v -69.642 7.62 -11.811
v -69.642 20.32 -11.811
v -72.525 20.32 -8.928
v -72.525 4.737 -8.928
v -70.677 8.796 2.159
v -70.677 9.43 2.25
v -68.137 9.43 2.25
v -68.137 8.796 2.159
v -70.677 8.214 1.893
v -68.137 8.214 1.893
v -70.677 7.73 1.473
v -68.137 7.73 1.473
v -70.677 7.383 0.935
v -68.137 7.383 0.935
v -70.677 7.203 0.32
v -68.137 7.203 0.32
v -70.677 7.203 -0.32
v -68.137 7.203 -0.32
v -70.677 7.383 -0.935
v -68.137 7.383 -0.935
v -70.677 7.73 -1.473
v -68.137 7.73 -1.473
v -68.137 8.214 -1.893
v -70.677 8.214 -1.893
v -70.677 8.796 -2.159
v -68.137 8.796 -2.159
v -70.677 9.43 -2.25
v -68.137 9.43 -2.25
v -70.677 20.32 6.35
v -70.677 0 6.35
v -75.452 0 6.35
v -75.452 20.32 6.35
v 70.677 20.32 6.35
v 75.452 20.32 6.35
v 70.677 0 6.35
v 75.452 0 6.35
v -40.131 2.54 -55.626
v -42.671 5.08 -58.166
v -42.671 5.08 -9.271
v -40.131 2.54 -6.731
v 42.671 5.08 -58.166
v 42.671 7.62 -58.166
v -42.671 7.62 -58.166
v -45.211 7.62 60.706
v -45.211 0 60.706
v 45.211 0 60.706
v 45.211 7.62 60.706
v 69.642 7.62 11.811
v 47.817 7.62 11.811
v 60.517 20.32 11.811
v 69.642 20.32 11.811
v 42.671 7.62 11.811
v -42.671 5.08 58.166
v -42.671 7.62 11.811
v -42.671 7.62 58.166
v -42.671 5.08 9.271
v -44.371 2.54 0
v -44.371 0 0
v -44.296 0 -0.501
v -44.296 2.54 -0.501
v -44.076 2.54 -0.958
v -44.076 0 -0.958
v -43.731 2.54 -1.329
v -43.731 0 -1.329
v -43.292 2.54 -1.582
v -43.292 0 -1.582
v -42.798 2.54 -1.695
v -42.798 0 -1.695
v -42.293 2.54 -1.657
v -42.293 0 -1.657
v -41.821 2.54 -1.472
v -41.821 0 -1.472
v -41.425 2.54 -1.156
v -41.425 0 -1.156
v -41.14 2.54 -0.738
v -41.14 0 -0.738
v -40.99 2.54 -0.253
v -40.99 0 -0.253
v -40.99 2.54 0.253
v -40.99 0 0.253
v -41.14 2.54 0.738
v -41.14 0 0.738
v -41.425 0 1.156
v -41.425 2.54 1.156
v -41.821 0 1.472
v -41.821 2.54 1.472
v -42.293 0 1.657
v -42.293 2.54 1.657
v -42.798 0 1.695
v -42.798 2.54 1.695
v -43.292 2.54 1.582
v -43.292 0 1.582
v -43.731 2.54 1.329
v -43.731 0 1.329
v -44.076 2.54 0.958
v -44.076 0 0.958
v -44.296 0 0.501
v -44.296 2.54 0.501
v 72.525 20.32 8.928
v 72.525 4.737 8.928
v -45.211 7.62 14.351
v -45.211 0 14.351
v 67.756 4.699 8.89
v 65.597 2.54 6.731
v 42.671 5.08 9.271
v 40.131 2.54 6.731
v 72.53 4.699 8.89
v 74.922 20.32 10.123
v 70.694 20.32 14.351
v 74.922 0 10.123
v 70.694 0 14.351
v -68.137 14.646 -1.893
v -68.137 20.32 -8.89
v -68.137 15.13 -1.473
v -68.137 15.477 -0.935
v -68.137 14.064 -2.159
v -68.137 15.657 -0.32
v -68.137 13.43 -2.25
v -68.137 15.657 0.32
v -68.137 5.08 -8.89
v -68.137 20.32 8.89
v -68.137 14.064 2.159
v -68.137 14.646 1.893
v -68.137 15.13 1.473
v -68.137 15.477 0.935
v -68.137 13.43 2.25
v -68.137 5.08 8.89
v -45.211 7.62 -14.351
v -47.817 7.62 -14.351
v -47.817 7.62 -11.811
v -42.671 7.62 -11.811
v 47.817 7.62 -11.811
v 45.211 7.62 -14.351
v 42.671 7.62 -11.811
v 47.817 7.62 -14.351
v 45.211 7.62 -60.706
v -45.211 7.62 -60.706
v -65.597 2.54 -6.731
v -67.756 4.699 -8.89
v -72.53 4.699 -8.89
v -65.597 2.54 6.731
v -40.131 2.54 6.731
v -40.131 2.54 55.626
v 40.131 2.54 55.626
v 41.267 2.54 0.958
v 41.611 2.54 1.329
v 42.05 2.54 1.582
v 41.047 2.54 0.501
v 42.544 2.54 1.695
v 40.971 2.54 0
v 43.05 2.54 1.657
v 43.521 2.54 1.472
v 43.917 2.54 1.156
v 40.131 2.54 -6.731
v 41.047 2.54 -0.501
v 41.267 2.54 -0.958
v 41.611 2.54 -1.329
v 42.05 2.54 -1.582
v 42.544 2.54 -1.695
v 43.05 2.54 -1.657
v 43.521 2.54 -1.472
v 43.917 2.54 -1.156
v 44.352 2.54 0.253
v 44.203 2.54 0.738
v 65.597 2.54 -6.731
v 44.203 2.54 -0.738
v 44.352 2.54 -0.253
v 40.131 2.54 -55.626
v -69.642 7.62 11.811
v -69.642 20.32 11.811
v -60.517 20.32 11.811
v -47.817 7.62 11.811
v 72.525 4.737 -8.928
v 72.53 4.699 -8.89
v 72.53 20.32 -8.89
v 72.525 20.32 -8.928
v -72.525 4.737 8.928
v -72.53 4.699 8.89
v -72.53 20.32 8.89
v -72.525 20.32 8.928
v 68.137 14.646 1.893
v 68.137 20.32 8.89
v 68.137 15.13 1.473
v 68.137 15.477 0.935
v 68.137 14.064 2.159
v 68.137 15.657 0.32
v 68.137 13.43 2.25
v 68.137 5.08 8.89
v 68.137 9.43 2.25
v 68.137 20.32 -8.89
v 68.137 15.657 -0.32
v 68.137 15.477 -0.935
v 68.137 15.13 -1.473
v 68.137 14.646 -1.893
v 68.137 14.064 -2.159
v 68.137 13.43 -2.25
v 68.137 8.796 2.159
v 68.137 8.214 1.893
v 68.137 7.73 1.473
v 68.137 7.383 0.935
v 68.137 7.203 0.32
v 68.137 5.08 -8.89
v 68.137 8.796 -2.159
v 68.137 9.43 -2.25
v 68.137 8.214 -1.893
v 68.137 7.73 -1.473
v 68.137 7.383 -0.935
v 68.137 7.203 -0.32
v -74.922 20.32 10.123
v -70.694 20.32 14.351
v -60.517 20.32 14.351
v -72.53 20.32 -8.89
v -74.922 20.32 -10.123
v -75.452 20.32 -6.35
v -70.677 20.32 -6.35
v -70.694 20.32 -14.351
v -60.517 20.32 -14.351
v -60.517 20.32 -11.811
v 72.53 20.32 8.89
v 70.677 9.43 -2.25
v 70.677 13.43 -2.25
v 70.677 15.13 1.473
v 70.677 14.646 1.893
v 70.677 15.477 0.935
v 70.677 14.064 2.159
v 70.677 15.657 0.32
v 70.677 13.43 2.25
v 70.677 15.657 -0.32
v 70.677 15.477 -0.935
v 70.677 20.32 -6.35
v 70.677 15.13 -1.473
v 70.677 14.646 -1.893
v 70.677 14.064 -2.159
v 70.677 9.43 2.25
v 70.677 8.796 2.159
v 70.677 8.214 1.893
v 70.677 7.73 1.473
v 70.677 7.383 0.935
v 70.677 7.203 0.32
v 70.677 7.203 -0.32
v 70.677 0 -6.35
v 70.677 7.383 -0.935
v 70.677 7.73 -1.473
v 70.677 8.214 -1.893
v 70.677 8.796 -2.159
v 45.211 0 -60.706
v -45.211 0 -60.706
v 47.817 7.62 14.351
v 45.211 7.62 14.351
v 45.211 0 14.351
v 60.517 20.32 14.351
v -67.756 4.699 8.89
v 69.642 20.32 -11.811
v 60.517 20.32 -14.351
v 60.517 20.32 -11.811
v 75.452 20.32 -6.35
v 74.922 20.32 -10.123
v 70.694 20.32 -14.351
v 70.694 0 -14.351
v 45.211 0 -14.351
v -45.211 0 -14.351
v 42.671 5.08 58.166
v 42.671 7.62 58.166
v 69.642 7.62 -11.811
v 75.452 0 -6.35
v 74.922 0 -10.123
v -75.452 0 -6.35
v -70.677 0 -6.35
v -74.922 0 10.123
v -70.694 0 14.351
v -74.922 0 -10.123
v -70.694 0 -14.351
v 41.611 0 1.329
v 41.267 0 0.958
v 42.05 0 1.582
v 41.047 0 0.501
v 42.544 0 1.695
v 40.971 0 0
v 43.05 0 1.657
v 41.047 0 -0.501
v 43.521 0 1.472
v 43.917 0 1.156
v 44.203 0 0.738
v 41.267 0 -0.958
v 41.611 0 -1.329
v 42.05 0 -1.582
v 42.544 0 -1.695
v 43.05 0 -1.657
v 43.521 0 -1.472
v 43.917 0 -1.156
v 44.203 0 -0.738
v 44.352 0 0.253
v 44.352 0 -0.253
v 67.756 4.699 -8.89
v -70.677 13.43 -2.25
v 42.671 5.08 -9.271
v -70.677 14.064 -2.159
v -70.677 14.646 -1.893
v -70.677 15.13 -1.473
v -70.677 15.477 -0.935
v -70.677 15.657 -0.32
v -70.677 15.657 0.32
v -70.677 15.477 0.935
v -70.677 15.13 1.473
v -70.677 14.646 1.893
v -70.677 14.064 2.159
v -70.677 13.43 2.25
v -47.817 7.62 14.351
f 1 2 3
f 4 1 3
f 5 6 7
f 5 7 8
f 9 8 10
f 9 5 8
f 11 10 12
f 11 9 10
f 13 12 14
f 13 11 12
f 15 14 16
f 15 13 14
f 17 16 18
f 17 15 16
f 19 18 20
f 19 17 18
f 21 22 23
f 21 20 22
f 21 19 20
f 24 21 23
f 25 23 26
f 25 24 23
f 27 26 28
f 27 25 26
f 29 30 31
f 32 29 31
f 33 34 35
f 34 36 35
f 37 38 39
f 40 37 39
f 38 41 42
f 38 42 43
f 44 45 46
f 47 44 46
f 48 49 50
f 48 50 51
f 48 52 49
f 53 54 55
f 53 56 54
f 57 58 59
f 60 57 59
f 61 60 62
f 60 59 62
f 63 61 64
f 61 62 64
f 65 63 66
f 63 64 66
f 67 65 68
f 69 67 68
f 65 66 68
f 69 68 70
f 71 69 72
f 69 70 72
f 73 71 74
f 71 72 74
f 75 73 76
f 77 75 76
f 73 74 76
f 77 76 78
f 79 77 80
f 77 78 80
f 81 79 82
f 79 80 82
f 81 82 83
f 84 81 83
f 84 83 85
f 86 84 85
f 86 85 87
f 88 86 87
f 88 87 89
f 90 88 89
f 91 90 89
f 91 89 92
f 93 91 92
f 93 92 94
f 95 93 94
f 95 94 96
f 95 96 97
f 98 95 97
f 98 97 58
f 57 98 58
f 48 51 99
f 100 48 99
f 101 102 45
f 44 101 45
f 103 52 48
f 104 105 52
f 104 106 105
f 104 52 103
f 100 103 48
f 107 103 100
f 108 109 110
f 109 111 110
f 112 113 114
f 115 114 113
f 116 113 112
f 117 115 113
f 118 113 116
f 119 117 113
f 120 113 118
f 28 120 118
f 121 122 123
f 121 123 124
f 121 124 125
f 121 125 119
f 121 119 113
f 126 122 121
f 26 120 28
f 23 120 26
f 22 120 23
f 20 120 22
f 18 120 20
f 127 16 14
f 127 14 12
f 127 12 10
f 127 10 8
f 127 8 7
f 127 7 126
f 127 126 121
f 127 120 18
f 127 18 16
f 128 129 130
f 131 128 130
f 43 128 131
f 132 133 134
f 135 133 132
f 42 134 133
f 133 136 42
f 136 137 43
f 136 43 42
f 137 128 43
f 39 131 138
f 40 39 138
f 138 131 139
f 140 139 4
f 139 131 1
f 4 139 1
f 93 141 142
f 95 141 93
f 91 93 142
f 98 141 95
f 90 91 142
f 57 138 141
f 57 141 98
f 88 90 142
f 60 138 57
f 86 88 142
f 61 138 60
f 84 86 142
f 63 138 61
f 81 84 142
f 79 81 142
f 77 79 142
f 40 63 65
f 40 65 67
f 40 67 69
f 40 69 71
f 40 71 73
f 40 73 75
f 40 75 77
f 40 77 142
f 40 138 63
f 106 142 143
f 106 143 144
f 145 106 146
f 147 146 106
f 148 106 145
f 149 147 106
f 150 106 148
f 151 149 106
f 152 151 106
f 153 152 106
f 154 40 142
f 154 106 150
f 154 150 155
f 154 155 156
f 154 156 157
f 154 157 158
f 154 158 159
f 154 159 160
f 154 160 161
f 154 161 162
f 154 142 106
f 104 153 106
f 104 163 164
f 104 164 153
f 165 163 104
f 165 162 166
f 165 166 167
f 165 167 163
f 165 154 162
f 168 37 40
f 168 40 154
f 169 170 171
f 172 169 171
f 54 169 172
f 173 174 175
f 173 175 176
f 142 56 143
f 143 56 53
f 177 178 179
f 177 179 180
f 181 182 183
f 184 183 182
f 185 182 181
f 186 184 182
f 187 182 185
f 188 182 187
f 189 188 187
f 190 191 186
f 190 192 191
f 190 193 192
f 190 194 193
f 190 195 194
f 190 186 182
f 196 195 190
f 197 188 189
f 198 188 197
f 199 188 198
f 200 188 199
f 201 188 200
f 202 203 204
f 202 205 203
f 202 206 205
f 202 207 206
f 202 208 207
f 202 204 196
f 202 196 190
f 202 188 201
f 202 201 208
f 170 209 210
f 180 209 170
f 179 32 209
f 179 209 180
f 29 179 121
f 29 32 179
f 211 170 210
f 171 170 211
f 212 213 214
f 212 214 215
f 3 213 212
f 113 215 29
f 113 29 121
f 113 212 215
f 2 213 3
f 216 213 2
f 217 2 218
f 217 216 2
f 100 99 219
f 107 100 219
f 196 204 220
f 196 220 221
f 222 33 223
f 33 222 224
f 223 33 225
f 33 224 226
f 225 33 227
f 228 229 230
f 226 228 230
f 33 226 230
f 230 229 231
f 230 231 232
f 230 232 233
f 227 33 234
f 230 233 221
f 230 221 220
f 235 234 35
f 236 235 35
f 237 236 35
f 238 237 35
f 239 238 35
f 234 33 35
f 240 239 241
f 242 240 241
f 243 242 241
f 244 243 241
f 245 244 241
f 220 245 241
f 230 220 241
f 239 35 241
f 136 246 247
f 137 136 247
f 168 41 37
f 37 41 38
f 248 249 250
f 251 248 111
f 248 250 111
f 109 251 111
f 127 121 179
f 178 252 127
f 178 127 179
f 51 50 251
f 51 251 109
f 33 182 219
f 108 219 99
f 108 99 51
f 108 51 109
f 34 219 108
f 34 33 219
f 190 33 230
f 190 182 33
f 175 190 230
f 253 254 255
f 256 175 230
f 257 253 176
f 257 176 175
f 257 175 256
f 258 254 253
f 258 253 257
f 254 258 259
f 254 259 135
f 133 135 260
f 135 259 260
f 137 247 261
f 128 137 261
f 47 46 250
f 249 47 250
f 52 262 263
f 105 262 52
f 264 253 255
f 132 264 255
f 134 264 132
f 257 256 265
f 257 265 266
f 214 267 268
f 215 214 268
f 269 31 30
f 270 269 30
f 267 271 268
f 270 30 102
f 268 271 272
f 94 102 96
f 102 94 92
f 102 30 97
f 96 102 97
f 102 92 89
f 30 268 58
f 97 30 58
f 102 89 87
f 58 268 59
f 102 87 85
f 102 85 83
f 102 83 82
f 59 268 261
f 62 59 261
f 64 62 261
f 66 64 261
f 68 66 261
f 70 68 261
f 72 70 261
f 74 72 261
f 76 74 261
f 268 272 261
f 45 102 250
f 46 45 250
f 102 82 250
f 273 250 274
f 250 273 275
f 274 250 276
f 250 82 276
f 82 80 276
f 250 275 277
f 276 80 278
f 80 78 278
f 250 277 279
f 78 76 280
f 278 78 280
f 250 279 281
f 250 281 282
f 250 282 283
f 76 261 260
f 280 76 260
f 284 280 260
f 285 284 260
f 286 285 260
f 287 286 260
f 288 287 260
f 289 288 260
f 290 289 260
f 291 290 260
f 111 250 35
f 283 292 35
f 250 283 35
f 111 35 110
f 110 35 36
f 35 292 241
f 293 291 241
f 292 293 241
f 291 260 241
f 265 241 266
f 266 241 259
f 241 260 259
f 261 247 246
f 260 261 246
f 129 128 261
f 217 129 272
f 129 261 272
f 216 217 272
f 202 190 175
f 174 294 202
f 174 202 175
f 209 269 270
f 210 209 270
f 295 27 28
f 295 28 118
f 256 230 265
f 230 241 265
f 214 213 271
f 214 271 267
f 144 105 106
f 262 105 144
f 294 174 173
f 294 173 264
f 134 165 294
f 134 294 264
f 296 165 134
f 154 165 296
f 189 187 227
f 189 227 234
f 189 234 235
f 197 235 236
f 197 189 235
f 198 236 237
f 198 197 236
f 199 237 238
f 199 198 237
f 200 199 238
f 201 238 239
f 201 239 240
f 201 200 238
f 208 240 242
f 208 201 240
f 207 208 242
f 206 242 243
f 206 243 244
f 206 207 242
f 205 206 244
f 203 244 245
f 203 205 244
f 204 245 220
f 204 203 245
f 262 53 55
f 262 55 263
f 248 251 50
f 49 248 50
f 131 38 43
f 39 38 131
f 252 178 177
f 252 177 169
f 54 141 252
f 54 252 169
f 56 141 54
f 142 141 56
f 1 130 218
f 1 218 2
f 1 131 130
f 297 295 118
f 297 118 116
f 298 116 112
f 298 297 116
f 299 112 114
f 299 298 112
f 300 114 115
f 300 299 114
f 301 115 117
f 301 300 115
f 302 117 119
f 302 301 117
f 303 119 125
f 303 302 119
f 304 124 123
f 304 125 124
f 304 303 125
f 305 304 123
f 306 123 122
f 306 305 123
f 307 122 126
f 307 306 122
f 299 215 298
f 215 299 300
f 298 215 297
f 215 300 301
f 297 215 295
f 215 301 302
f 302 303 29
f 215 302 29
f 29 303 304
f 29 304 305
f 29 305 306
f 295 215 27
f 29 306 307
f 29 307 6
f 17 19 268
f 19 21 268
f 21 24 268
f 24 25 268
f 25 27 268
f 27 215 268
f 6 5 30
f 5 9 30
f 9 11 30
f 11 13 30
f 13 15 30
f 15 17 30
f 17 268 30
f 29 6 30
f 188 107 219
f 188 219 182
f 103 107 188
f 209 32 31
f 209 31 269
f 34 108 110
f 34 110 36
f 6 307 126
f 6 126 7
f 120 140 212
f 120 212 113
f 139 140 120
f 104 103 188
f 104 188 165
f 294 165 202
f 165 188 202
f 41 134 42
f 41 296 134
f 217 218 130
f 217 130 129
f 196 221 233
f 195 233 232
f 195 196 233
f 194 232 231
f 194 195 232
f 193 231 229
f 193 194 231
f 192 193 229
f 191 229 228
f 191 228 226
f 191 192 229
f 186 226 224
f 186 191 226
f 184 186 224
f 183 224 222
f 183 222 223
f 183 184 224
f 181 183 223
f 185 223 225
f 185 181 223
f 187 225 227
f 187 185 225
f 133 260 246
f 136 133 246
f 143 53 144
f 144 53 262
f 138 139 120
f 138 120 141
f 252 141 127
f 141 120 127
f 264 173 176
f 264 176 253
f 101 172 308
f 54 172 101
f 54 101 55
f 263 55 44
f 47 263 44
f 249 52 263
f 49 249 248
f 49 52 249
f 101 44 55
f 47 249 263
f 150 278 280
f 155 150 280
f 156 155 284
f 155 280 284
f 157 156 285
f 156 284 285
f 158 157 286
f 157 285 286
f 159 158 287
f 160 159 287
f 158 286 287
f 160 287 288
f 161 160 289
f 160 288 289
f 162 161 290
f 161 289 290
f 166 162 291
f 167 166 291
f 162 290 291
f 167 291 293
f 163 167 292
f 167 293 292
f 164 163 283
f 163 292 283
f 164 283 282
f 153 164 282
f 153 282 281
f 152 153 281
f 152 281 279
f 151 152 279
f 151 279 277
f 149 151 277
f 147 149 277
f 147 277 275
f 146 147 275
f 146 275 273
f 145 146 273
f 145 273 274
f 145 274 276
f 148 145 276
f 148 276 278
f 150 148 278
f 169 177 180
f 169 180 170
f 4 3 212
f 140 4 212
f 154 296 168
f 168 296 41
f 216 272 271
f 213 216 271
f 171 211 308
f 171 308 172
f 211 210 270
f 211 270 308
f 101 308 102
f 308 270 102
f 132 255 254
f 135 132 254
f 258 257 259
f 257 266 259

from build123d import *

# Parameters (mm, degrees)
SKETCH4_W                = 90.422573022
SKETCH4_H                = 121.412
BOSS_EXTRUDE2_DEPTH      = 2.54
BOSS_EXTRUDE3_DEPTH      = 2.54
BOSS_EXTRUDE4_DEPTH      = 17.78
SKETCH7_W                = 121.034311438
SKETCH7_H                = 121.412
CUT_EXTRUDE1_DEPTH       = 12.7
CHAMFER1_SIZE            = 12.7
CHAMFER3_SIZE            = 5.08
CHAMFER4_SIZE            = 2.54
M4_START                 = -70.677155719
M4_CLEARANCE_SLOT1_DEPTH = 141.354311438
M3_CLEARANCE_HOLE1_D     = 3.4


# Read off the part's stored shape, not the designer's step: M4 Clearance Slot1
with BuildPart() as part:
    # Sketch4 → Boss-Extrude2 (new body)
    with BuildSketch(Plane(origin=(0, 0, 0), x_dir=(1, 0, 0), z_dir=(0, 1, 0))):
        Rectangle(SKETCH4_W, SKETCH4_H)
    extrude(amount=BOSS_EXTRUDE2_DEPTH)

    # Sketch5 → Boss-Extrude3 (add)
    with BuildSketch(Plane(origin=(0, 0, 0), x_dir=(1, 0, 0), z_dir=(0, 1, 0))):
        Polygon((45.211286511, 14.351), (70.694027546, 14.351), (74.922106204, 10.122921342), (75.452355719, 6.35), (70.677155719, 6.35), (70.677155719, -6.35), (75.452355719, -6.35), (74.922106204, -10.122921342), (70.694027546, -14.351), (45.211286511, -14.351), align=None)
        Polygon((-45.211286511, 14.351), (-45.211286511, -14.351), (-70.694027546, -14.351), (-74.922106204, -10.122921342), (-75.452355719, -6.35), (-70.677155719, -6.35), (-70.677155719, 6.35), (-75.452355719, 6.35), (-74.922106204, 10.122921342), (-70.694027546, 14.351), align=None)
    extrude(amount=BOSS_EXTRUDE3_DEPTH)

    # Sketch6 → Boss-Extrude4 (add)
    with BuildSketch(Plane(origin=(0, 2.54, 0), x_dir=(1, 0, 0), z_dir=(0, 1, 0))):
        Polygon((45.211286511, -60.706), (45.211286511, -14.351), (70.694027546, -14.351), (74.922106204, -10.122921342), (75.452355719, -6.35), (70.677155719, -6.35), (70.677155719, 6.35), (75.452355719, 6.35), (74.922106204, 10.122921342), (70.694027546, 14.351), (45.211286511, 14.351), (45.211286511, 60.706), (-45.211286511, 60.706), (-45.211286511, 14.351), (-70.694027546, 14.351), (-74.922106204, 10.122921342), (-75.452355719, 6.35), (-70.677155719, 6.35), (-70.677155719, -6.35), (-75.452355719, -6.35), (-74.922106204, -10.122921342), (-70.694027546, -14.351), (-45.211286511, -14.351), (-45.211286511, -60.706), align=None)
        Polygon((42.671286511, -58.166), (42.671286511, -11.811), (69.641925098, -11.811), (72.525104647, -8.927820451), (72.530419964, -8.89), (68.137155719, -8.89), (68.137155719, 8.89), (72.530419964, 8.89), (72.525104647, 8.927820451), (69.641925098, 11.811), (42.671286511, 11.811), (42.671286511, 58.166), (-42.671286511, 58.166), (-42.671286511, 11.811), (-69.641925098, 11.811), (-72.525104647, 8.927820451), (-72.530419964, 8.89), (-68.137155719, 8.89), (-68.137155719, -8.89), (-72.530419964, -8.89), (-72.525104647, -8.927820451), (-69.641925098, -11.811), (-42.671286511, -11.811), (-42.671286511, -58.166), align=None, mode=Mode.SUBTRACT)
    extrude(amount=BOSS_EXTRUDE4_DEPTH)

    # Sketch7 → Cut-Extrude1 (cut)
    with BuildSketch(Plane(origin=(0, 20.32, 0), x_dir=(1, 0, 0), z_dir=(0, 1, 0))):
        Rectangle(SKETCH7_W, SKETCH7_H)
    extrude(amount=-CUT_EXTRUDE1_DEPTH, mode=Mode.SUBTRACT)

    # Chamfer1
    chamfer1_edges = [part.edges().sort_by_distance(p)[0] for p in [
        (-60.517155719, 7.62, -13.081),
        (-60.517155719, 7.62, 13.081),
        (60.517155719, 7.62, 13.081),
        (60.517155719, 7.62, -13.081),
    ]]
    chamfer(chamfer1_edges, length=CHAMFER1_SIZE - 0.0001)  # a hair under: the kernel refuses the full size

    # Chamfer3
    chamfer3_edges = [part.edges().sort_by_distance(p)[0] for p in [
        (-56.156605804, 2.54, 11.811),
        (-56.156605804, 2.54, -11.811),
        (56.156605804, 2.54, 11.811),
        (56.156605804, 2.54, -11.811),
    ]]
    chamfer(chamfer3_edges, length=CHAMFER3_SIZE - 0.0001)  # a hair under: the kernel refuses the full size

    # Chamfer4
    chamfer4_edges = [part.edges().sort_by_distance(p)[0] for p in [
        (42.671286511, 2.54, 32.44855),
        (0, 2.54, 58.166),
        (-42.671286511, 2.54, 32.44855),
        (-42.671286511, 2.54, -32.44855),
        (42.671286511, 2.54, -32.44855),
        (0, 2.54, -58.166),
        (-68.137155719, 2.54, 0),
        (68.137155719, 2.54, 0),
    ]]
    chamfer(chamfer4_edges, length=CHAMFER4_SIZE)

    # M4 Clearance Slot1 outline → M4 Clearance Slot1 (cut)
    with BuildSketch(Plane.YZ.offset(M4_START)):
        with BuildLine():
            Line((9.43, -2.25), (13.43, -2.25))
            ThreePointArc((13.43, -2.25), (15.68, 0), (13.43, 2.25))
            Line((13.43, 2.25), (9.43, 2.25))
            ThreePointArc((9.43, 2.25), (7.18, 0), (9.43, -2.25))
        make_face()
    extrude(amount=M4_CLEARANCE_SLOT1_DEPTH, mode=Mode.SUBTRACT)

    # M3 Clearance Hole1 (through all)
    with Locations(Plane(origin=(0, 2.54, 0), x_dir=(1, 0, 0), z_dir=(0, 1, 0))):
        with Locations((42.671286511, 0), (-42.671286511, 0)):
            Hole(M3_CLEARANCE_HOLE1_D / 2)


solid = part.part
